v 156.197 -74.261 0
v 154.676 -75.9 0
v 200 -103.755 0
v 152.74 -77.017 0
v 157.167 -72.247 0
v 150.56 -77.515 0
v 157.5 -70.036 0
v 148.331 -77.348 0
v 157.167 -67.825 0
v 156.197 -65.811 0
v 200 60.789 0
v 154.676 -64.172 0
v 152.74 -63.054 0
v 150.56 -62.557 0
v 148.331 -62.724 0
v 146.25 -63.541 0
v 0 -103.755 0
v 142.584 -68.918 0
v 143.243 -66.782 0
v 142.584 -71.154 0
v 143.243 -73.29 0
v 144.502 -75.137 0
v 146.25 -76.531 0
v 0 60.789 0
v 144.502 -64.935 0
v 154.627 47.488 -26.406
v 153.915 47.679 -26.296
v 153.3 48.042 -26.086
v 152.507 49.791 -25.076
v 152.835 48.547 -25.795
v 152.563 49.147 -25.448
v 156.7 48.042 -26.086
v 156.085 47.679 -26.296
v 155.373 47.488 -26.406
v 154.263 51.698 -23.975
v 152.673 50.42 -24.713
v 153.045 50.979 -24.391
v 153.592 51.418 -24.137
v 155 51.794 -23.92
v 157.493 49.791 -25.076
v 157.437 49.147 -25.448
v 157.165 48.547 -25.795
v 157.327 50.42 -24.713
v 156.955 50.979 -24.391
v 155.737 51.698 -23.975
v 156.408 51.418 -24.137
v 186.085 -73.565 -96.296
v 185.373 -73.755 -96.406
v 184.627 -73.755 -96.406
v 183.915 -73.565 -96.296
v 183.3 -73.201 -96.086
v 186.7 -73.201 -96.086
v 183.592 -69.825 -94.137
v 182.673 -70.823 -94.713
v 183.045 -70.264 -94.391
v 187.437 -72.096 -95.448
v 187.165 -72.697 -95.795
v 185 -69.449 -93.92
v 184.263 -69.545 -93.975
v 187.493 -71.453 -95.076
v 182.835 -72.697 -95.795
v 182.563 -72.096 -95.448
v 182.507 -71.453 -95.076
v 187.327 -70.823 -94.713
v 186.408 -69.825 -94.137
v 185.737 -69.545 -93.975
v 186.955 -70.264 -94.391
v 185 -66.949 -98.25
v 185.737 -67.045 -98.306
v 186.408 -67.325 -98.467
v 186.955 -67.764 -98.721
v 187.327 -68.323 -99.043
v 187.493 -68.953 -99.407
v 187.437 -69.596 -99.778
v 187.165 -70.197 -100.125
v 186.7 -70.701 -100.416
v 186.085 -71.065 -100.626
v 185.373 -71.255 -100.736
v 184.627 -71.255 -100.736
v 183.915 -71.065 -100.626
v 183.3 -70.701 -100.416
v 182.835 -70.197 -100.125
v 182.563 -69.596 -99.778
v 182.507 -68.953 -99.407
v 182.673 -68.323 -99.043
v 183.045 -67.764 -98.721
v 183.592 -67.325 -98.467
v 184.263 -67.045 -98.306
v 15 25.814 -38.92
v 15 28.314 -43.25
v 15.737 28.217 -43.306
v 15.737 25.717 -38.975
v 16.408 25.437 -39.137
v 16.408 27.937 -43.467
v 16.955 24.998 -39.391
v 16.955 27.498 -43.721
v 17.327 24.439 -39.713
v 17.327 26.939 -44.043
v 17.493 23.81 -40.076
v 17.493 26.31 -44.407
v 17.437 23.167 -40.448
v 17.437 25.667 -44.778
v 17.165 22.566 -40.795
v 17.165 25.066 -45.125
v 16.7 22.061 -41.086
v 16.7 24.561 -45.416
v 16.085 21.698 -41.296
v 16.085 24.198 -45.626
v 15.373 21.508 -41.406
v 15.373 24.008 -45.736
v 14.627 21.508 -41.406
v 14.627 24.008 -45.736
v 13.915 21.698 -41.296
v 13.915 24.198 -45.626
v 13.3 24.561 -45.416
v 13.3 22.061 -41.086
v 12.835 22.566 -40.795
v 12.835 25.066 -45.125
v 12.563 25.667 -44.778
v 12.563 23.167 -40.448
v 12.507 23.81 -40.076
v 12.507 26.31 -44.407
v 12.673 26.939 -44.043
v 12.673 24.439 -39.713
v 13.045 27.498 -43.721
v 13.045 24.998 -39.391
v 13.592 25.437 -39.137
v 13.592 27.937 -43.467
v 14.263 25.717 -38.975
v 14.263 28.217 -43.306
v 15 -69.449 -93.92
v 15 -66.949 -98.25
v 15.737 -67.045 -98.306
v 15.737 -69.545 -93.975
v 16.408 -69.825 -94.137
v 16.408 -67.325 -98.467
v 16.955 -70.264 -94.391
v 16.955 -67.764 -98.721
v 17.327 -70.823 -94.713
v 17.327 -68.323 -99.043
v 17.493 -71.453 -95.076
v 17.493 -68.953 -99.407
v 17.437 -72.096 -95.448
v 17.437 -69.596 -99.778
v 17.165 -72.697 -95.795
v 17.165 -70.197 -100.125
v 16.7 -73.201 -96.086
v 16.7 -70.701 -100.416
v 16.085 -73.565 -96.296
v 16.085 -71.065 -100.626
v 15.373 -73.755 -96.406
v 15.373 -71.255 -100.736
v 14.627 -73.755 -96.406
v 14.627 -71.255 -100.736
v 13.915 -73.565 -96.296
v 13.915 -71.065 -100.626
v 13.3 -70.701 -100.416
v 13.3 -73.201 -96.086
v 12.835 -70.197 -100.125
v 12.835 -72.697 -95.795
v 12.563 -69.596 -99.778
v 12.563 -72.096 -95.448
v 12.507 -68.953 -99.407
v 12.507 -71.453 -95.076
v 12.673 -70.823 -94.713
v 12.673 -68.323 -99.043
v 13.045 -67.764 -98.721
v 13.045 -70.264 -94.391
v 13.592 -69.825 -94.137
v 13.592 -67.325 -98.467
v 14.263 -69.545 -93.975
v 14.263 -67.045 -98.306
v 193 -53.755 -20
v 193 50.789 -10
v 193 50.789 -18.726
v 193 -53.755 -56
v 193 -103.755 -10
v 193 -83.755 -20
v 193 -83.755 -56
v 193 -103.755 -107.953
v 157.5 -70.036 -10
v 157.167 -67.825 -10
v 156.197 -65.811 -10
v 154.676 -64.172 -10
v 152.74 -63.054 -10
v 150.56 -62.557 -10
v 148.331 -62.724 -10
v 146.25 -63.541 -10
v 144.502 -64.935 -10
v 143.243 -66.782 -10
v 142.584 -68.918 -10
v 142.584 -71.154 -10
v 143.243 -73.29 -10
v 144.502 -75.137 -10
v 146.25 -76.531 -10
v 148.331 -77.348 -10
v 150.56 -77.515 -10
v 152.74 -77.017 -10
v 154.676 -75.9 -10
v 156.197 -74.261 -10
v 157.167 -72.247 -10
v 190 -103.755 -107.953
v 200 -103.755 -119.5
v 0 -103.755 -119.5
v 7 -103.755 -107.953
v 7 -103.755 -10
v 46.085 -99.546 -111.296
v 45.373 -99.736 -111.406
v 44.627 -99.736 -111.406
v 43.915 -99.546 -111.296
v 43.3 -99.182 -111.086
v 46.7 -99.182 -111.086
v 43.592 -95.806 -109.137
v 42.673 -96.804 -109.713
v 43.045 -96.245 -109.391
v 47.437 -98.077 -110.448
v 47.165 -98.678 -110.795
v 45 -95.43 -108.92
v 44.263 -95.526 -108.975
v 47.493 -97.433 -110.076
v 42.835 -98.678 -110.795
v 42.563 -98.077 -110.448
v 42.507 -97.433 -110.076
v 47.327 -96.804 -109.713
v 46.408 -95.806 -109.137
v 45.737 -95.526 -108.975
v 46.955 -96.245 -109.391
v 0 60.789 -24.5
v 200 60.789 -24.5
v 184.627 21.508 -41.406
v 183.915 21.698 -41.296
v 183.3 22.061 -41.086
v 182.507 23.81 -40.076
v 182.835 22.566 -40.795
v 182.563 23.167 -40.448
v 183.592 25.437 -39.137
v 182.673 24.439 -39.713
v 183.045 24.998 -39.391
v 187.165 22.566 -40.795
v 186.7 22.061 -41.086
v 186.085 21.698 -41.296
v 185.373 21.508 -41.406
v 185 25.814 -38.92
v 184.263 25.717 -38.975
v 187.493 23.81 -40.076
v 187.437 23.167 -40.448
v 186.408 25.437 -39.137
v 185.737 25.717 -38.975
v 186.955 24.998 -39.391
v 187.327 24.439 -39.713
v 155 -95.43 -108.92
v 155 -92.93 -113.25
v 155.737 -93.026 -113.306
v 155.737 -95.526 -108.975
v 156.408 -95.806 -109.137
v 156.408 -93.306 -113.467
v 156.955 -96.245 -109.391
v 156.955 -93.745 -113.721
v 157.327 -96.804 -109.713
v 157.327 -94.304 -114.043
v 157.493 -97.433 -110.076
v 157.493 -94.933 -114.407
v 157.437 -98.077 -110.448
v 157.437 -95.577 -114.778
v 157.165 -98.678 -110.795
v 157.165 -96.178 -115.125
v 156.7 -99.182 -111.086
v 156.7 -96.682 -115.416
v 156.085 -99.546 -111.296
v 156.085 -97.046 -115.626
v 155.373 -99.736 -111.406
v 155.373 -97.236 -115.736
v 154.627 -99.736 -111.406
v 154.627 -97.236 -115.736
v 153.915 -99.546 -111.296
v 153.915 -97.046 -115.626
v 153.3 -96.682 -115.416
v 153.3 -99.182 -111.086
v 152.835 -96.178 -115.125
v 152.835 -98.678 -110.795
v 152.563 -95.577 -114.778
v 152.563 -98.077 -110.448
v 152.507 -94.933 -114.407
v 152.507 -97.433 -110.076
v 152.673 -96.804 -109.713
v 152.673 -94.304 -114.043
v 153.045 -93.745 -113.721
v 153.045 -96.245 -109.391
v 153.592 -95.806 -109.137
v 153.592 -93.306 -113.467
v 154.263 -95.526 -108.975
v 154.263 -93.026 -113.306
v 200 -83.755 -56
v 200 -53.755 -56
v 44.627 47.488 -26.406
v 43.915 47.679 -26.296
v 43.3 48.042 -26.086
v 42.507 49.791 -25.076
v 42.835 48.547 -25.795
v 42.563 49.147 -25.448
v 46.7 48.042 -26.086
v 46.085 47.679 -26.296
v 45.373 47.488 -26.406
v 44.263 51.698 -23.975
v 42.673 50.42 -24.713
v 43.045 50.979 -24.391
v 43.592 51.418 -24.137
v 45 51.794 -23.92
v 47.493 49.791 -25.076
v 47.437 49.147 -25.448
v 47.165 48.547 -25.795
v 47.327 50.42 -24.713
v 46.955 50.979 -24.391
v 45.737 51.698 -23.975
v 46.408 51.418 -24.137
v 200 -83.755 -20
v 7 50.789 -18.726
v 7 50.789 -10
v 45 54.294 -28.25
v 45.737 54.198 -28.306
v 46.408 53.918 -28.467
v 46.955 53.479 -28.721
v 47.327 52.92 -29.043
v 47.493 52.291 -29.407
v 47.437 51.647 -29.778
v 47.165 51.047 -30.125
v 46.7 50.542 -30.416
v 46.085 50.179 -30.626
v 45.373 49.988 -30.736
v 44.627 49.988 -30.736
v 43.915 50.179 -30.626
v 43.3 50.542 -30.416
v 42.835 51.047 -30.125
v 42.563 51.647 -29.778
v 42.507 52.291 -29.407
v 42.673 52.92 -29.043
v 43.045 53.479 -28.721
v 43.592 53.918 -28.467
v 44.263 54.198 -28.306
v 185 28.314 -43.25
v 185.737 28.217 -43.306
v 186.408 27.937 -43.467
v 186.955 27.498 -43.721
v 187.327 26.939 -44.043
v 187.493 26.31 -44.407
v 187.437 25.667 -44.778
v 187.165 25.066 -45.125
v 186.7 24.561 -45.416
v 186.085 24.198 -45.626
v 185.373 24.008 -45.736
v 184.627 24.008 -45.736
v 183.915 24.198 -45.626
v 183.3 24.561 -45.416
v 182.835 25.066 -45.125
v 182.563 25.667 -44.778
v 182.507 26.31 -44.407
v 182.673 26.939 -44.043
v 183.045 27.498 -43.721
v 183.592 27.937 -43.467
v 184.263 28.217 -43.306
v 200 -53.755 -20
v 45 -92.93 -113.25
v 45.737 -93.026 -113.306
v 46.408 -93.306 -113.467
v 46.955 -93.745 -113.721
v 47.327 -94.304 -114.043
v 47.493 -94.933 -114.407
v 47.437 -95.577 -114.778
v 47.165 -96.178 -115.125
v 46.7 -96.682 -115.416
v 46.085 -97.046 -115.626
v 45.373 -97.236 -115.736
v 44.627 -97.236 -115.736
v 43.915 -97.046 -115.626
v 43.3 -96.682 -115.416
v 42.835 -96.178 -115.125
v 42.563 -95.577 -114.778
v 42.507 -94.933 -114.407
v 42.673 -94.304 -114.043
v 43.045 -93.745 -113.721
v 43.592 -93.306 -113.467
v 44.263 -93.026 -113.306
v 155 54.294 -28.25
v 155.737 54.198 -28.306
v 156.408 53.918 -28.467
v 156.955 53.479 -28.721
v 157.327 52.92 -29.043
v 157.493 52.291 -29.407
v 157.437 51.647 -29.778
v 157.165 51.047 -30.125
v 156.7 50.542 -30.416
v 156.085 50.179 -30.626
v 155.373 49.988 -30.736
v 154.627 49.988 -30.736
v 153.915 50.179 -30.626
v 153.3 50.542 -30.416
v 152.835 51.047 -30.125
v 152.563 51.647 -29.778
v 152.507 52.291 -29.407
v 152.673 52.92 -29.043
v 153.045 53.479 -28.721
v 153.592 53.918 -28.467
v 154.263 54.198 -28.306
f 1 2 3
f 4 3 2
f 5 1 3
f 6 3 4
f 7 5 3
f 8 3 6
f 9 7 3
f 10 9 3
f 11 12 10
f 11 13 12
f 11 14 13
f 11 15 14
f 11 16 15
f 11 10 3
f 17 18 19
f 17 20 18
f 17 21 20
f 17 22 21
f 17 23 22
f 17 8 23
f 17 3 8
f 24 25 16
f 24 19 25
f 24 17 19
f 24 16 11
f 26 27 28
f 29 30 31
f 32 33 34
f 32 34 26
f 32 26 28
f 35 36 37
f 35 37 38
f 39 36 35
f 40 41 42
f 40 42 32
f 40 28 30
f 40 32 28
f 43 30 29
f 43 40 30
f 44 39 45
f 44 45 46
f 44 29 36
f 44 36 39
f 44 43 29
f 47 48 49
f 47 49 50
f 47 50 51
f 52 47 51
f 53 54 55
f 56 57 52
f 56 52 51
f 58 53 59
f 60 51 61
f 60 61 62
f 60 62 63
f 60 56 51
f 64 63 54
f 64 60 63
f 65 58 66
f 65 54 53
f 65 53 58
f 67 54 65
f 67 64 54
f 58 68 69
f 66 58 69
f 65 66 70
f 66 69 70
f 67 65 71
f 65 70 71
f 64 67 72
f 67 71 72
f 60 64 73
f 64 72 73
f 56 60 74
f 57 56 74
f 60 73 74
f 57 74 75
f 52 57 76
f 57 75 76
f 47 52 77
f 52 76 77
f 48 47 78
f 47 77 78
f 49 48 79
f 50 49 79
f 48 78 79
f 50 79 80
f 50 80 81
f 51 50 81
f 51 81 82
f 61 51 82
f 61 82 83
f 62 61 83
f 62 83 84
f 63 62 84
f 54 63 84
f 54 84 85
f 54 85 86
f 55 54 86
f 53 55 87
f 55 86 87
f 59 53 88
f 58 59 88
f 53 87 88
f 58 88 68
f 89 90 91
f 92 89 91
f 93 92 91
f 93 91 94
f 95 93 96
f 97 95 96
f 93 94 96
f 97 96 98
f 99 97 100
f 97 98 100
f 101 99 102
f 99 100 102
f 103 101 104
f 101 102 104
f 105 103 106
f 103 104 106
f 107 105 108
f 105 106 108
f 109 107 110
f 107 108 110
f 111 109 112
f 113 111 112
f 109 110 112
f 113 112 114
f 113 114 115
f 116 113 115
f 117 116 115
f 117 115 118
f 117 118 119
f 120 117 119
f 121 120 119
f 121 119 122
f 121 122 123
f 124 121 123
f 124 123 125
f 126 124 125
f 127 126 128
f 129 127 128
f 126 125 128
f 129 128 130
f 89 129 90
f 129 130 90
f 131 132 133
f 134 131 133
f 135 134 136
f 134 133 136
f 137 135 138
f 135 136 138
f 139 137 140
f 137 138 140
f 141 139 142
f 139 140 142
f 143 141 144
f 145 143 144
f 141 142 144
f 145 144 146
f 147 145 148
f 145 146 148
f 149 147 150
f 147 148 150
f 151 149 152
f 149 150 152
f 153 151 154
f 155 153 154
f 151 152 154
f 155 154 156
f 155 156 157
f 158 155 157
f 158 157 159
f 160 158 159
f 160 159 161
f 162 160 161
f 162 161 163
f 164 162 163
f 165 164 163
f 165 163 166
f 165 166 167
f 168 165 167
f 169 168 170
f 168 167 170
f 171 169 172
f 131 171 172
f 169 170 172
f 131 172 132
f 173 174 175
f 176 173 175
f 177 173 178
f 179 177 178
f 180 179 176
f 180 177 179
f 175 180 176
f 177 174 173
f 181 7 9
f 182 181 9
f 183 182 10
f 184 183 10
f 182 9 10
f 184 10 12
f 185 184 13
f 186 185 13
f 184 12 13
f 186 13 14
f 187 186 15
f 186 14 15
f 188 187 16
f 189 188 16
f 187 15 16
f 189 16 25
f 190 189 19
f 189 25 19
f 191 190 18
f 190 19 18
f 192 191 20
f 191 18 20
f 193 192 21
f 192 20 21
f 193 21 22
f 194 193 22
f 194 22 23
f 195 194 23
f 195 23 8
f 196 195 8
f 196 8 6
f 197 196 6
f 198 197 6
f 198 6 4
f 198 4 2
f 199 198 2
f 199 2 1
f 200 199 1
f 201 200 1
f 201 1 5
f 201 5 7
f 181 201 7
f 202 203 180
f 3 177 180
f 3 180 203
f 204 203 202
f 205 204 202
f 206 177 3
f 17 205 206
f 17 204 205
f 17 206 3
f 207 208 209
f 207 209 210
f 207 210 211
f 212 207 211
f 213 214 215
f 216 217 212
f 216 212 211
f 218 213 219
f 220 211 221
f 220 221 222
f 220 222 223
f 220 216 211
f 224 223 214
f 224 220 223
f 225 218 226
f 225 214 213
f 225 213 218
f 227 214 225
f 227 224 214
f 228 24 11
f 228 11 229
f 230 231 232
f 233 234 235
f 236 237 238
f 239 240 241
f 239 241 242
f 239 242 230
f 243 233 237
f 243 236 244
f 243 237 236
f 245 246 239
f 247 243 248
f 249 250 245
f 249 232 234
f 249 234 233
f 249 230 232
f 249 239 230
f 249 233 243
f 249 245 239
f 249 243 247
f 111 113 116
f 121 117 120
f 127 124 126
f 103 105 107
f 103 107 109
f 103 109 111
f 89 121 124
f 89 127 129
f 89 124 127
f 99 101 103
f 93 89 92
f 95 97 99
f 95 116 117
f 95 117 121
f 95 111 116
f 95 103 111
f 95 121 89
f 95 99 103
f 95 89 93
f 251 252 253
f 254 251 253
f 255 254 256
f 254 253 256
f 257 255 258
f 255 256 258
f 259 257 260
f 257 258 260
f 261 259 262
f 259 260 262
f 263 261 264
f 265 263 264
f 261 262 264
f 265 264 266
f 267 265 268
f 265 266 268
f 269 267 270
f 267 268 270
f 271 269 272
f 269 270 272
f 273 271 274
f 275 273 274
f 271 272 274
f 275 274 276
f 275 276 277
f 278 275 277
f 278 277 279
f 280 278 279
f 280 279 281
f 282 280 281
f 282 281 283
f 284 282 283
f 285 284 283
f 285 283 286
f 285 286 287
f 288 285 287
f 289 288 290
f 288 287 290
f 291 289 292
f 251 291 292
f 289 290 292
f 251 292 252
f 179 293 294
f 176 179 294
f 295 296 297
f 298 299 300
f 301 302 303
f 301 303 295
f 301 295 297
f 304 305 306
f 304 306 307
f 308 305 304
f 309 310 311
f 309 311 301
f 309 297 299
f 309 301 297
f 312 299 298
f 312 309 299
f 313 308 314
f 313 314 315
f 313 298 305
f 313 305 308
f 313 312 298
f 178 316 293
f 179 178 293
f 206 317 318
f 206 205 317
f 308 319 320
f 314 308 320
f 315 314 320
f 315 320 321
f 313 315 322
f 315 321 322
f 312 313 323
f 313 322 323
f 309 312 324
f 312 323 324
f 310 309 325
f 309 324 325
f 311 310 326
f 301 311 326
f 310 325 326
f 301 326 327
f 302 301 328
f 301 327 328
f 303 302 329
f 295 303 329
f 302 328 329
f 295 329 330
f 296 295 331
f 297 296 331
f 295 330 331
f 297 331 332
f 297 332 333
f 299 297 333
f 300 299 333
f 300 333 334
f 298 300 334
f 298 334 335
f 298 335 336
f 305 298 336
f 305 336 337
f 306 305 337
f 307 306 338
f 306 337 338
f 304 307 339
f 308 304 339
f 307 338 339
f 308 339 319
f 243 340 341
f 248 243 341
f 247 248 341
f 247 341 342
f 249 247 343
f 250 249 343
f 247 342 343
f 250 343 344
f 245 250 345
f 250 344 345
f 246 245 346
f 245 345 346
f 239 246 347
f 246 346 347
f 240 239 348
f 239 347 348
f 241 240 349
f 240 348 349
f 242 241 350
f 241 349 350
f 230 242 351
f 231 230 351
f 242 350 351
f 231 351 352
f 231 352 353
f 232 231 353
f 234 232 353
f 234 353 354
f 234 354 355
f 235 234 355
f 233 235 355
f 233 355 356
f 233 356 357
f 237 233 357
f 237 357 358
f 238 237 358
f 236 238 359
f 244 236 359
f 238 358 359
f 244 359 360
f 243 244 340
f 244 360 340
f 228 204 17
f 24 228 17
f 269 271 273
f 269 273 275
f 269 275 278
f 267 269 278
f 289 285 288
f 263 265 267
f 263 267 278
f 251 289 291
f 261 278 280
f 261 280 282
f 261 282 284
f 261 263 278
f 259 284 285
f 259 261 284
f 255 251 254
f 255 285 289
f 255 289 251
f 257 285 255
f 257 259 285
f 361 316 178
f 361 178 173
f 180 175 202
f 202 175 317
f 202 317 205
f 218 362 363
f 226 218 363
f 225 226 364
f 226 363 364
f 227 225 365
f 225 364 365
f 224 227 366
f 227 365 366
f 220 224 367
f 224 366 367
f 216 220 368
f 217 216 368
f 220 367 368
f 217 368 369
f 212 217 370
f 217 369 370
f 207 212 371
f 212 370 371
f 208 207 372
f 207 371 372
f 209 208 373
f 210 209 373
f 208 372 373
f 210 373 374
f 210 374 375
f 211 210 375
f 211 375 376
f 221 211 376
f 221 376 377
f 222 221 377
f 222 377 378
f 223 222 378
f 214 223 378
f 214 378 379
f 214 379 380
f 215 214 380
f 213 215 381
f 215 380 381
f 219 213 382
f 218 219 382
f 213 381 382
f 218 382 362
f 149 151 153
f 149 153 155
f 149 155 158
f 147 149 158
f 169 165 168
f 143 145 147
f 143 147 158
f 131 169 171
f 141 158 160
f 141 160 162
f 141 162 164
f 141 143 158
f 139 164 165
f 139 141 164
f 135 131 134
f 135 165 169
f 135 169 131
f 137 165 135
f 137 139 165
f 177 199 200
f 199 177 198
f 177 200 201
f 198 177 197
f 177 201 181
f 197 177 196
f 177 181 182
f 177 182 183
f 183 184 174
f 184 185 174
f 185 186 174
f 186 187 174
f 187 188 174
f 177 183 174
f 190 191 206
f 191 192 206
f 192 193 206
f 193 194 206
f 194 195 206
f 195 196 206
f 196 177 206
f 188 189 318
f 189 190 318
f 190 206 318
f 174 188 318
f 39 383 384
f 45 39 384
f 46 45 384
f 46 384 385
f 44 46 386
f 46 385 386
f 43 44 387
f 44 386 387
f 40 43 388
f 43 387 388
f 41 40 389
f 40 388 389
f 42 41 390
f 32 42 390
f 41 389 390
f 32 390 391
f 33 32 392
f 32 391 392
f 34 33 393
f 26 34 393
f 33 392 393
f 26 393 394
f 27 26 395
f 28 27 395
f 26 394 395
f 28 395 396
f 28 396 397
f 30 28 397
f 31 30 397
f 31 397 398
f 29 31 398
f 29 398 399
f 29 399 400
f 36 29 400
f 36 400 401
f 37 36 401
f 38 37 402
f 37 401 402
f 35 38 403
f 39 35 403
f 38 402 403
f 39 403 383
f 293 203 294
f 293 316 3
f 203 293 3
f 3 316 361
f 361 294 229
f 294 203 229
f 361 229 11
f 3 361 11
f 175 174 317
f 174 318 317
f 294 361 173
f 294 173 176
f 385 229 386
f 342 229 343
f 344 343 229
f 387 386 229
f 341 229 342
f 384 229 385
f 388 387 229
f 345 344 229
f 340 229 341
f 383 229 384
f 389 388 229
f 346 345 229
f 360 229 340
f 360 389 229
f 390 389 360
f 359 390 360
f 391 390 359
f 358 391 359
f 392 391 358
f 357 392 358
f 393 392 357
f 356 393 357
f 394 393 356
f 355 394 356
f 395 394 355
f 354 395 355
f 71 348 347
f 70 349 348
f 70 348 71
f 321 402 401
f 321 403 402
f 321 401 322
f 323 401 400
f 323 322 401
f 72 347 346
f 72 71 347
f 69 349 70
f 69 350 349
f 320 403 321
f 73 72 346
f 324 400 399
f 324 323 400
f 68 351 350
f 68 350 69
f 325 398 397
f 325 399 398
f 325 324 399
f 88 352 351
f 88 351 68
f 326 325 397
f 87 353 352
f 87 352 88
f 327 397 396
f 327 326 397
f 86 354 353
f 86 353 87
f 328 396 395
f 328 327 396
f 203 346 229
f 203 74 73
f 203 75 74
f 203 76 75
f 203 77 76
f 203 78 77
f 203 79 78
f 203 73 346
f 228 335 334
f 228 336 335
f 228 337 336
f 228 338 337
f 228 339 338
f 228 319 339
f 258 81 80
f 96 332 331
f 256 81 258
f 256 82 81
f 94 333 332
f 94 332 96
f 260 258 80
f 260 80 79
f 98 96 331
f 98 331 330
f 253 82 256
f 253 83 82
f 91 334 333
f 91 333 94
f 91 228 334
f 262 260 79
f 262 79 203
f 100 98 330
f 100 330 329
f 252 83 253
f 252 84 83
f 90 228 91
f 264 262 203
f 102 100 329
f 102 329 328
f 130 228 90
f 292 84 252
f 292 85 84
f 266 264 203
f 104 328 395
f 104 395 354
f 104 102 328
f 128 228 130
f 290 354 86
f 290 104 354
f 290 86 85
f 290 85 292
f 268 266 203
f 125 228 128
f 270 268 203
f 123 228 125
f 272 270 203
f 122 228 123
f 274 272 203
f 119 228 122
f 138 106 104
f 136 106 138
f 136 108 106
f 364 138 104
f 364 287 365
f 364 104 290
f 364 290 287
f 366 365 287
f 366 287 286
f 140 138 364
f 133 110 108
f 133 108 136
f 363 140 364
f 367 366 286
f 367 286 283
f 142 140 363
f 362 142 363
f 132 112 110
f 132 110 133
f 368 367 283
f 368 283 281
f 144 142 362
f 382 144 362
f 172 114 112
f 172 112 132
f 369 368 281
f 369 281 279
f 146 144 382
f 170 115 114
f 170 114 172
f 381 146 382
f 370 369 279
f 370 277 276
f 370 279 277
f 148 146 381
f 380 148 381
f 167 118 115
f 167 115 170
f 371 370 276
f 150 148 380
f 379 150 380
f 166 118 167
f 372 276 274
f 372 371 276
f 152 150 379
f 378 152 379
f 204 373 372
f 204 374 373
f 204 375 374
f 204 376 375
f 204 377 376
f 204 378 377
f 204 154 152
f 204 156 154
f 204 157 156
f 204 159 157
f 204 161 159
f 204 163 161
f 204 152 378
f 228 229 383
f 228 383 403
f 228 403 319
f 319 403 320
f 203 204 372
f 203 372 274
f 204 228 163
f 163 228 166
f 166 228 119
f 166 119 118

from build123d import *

# Parameters (mm, degrees)
BOSS_EXTRUDE1_DEPTH      = 200
SHELL1_T                 = -10
SHELL1_THICKNESS_2_DEPTH = 3
SHELL1_THICKNESS_3_DEPTH = 3
SKETCH4_R                = 2.5
CUT_EXTRUDE2_DEPTH       = 5
SKETCH5_W                = 36
SKETCH5_H                = 30
CUT_EXTRUDE3_DEPTH       = 20
SKETCH6_R                = 7.5
CUT_EXTRUDE4_DEPTH       = 20


with BuildPart() as part:
    # Sketch2 → Boss-Extrude1 (new body)
    with BuildSketch(Plane(origin=(0, 0, 0), x_dir=(0, 0, -1), z_dir=(1, 0, 0))):
        Polygon((0, 60.789473684), (24.5, 60.789473684), (119.5, -103.755353035), (0, -103.755353035), align=None)
    extrude(amount=BOSS_EXTRUDE1_DEPTH)

    # Shell1
    shell1_openings = [part.faces().sort_by_distance(p)[0] for p in [
        (100, -103.755353035, -59.75),
    ]]
    offset(amount=SHELL1_T, openings=shell1_openings, kind=Kind.INTERSECTION)

    # Shell1 thickness 2 face (on inner face of the shell) → Shell1 thickness 2 (cut)
    with BuildSketch(Plane(origin=(190, -48.02643305, -42.888943831), x_dir=(0, 0, 1), z_dir=(1, 0, 0))):
        Polygon((32.888943831, -98.815906734), (24.162446523, -98.815906734), (-65.064050785, 55.728919985), (32.888943831, 55.728919985), align=None)
    extrude(amount=SHELL1_THICKNESS_2_DEPTH, mode=Mode.SUBTRACT)

    # Shell1 thickness 3 face (on inner face of the shell) → Shell1 thickness 3 (cut)
    with BuildSketch(Plane(origin=(10, -48.02643305, -42.888943831), x_dir=(0, 0, -1), z_dir=(-1, 0, 0))):
        Polygon((-24.162446523, -98.815906734), (-32.888943831, -98.815906734), (-32.888943831, 55.728919985), (65.064050785, 55.728919985), align=None)
    extrude(amount=SHELL1_THICKNESS_3_DEPTH, mode=Mode.SUBTRACT)

    # Sketch4 → Cut-Extrude2 (cut)
    with BuildSketch(Plane(origin=(0, 25.806179617, -44.697614247), x_dir=(-1, 0, 0), z_dir=(0, 0.499999999999998, -0.8660254037844397))):
        with Locations(Location((-185, 0.395228493, 0), (0, 0, 90))):
            Circle(SKETCH4_R)
        with Locations(Location((-185, -109.604771507, 0), (0, 0, 90))):
            Circle(SKETCH4_R)
        with Locations(Location((-155, -139.604771507, 0), (0, 0, 90))):
            Circle(SKETCH4_R)
        with Locations(Location((-45, -139.604771507, 0), (0, 0, 90))):
            Circle(SKETCH4_R)
        with Locations(Location((-15, -109.604771507, 0), (0, 0, 90))):
            Circle(SKETCH4_R)
        with Locations(Location((-15, 0.395228493, 0), (0, 0, 90))):
            Circle(SKETCH4_R)
        with Locations(Location((-45, 30.395228493, 0), (0, 0, 90))):
            Circle(SKETCH4_R)
        with Locations(Location((-155, 30.395228493, 0), (0, 0, 90))):
            Circle(SKETCH4_R)
    extrude(amount=-CUT_EXTRUDE2_DEPTH, mode=Mode.SUBTRACT)

    # Sketch5 → Cut-Extrude3 (cut)
    with BuildSketch(Plane(origin=(200, 0, 0), x_dir=(0, 0, -1), z_dir=(1, 0, 0))):
        with Locations((38, -68.755353035)):
            Rectangle(SKETCH5_W, SKETCH5_H)
    extrude(amount=-CUT_EXTRUDE3_DEPTH, mode=Mode.SUBTRACT)

    # Sketch6 → Cut-Extrude4 (cut)
    with BuildSketch(Plane.XY):
        with Locations((150, -70.035876083)):
            Circle(SKETCH6_R)
    extrude(amount=-CUT_EXTRUDE4_DEPTH, mode=Mode.SUBTRACT)


solid = part.part
